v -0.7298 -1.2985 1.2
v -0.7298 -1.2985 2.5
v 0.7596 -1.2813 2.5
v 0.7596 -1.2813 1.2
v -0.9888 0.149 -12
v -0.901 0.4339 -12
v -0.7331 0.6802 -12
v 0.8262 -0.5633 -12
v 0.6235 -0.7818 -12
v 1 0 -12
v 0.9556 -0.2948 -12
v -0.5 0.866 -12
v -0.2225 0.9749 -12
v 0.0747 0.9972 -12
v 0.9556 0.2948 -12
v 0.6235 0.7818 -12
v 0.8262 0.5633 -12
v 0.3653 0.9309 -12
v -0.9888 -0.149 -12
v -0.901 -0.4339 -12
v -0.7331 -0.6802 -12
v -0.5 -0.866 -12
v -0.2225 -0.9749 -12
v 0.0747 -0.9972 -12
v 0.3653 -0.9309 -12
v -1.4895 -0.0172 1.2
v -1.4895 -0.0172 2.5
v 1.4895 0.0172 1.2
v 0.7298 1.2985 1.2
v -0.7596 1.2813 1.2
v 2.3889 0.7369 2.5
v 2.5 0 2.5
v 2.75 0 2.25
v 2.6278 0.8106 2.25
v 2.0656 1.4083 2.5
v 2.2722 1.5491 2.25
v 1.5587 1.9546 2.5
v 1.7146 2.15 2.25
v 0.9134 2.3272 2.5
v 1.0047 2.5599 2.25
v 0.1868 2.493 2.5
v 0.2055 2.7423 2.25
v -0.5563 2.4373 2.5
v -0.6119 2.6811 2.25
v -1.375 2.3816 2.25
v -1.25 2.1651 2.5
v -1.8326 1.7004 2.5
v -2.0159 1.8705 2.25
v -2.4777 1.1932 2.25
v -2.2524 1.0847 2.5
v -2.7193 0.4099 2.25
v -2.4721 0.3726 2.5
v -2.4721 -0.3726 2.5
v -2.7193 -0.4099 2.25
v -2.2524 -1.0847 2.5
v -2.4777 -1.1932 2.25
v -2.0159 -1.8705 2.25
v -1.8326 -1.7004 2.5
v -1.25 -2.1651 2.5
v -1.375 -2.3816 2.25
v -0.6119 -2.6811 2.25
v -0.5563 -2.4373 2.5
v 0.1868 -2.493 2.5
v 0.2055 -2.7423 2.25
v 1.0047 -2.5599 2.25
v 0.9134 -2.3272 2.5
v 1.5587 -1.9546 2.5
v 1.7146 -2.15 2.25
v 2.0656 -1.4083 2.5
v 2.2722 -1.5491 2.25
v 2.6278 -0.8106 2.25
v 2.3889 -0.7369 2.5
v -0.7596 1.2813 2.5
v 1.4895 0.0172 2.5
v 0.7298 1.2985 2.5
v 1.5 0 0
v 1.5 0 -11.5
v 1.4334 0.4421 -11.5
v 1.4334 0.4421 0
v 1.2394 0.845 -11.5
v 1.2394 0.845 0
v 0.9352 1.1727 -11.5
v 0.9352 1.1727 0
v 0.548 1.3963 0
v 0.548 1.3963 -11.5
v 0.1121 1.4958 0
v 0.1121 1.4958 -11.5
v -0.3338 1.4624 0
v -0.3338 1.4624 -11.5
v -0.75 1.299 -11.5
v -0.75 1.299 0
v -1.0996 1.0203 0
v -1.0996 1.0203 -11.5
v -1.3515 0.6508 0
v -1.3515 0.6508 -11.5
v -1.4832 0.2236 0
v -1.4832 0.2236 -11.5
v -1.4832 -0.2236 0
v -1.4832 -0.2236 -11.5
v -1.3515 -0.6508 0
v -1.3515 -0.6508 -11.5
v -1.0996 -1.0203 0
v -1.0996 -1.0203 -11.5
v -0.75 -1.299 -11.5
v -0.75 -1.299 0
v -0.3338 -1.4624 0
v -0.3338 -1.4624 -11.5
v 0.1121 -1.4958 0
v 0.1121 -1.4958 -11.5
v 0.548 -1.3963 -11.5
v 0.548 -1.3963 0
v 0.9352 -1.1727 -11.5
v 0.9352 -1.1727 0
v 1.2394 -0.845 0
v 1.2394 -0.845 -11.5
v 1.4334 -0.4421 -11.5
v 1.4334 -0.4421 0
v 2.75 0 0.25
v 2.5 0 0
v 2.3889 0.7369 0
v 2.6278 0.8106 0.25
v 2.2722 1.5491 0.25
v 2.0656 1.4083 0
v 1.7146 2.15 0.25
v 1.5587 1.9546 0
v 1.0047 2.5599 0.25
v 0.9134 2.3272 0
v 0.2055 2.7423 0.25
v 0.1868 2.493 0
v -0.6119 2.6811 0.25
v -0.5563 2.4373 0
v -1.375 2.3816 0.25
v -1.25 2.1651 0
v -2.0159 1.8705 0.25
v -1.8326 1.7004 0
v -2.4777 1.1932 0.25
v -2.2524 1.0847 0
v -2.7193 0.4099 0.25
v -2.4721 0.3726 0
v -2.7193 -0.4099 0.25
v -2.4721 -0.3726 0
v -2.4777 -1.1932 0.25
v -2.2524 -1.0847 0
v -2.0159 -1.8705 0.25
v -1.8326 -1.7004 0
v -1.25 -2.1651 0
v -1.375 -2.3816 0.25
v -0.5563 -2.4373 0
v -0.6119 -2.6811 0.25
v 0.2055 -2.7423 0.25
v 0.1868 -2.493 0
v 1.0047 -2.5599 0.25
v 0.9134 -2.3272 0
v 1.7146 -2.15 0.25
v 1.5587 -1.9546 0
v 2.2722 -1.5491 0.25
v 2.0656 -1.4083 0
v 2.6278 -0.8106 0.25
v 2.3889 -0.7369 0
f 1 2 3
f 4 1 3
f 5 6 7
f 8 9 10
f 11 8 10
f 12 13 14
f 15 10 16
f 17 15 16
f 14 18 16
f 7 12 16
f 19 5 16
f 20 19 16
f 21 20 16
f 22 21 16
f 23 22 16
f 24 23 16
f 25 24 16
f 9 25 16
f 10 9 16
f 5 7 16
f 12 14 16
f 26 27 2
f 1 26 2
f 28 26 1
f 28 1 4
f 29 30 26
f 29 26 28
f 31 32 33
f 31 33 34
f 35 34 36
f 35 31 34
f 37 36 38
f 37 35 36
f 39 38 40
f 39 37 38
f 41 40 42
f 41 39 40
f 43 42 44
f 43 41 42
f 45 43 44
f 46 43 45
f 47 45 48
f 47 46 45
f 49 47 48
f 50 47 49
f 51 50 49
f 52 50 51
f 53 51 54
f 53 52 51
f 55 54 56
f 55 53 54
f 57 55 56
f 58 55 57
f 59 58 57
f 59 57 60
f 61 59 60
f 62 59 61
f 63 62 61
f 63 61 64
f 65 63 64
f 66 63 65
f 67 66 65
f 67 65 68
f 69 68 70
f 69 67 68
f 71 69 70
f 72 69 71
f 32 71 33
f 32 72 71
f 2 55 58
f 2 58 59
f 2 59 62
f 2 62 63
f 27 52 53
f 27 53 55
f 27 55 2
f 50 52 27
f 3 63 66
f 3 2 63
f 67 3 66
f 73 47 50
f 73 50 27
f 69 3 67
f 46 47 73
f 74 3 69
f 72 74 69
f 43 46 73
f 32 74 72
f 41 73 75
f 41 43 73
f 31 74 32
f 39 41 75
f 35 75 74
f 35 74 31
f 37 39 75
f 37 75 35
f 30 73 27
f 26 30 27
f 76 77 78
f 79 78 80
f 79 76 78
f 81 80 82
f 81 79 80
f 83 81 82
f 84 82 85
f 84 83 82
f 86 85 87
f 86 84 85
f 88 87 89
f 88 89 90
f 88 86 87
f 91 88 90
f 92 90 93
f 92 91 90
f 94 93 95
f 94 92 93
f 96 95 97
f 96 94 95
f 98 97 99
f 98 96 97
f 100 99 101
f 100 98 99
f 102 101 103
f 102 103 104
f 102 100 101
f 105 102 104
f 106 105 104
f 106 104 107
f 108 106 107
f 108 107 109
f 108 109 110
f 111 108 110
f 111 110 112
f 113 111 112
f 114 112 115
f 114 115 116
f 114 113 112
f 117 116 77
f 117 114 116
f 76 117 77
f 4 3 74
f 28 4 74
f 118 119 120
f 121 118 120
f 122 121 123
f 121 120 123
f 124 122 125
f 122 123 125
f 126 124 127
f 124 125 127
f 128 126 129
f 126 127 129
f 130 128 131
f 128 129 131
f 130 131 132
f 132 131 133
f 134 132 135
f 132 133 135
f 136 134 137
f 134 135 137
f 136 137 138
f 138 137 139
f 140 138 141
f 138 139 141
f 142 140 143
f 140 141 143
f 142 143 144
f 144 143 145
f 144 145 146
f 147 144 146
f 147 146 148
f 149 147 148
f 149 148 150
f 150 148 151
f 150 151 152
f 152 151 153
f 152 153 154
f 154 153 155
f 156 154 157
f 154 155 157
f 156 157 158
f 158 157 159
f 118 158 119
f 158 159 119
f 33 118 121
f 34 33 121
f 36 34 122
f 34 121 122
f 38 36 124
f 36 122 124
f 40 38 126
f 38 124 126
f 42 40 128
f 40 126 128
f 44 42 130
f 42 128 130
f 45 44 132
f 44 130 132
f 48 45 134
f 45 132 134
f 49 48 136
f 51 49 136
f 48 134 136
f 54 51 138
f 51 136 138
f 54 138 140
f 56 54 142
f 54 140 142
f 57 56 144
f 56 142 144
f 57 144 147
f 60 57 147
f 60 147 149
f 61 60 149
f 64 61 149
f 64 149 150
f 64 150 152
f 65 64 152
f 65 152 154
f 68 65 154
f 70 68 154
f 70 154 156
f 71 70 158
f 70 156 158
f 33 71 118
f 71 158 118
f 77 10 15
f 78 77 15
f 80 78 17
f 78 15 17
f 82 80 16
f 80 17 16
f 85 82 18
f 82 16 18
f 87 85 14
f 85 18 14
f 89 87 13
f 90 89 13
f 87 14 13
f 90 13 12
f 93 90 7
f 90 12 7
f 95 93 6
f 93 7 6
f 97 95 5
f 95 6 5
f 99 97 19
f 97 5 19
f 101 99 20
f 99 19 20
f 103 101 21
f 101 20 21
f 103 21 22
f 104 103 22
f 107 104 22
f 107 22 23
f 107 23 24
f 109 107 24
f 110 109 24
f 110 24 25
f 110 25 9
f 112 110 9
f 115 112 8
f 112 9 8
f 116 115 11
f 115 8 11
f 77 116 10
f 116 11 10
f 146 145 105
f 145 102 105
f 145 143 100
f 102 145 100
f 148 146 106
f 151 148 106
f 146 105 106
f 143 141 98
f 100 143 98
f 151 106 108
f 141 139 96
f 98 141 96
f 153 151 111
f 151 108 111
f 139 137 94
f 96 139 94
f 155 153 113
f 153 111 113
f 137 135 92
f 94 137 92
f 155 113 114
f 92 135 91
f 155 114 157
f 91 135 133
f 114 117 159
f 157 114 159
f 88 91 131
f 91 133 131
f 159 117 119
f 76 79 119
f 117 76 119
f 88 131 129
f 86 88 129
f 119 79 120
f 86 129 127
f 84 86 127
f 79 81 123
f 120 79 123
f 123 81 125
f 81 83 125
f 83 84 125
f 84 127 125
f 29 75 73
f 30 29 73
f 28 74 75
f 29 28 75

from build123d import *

# Parameters (mm, degrees)
F0_R     = 1.5
F1_DEPTH = 12
F2_SIZE  = 0.5
F0_R_2   = 2.75
F3_DEPTH = 2.5
F4_SIZE  = 0.25
F6_DEPTH = 1.3


with BuildPart() as f1:
    # F0 (on Top) → F1 (new body)
    with BuildSketch(Plane.XY):
        Circle(F0_R)
    extrude(amount=-F1_DEPTH)

    # F2
    f2_edges = [f1.edges().sort_by_distance(p)[0] for p in [
        (-1.5, 0, -12),
    ]]
    chamfer(f2_edges, length=F2_SIZE)

    # F0 (on Top) → F3 (join)
    with BuildSketch(Plane.XY):
        Circle(F0_R_2)
        Circle(F0_R, mode=Mode.SUBTRACT)
        Circle(F0_R)
    extrude(amount=F3_DEPTH)

    # F4
    f4_edges = [f1.edges().sort_by_distance(p)[0] for p in [
        (-2.75, 0, 2.5),
        (-2.75, 0, 0),
    ]]
    chamfer(f4_edges, length=F4_SIZE)

    # F5 (on face) → F6 (cut)
    with BuildSketch(Plane.XY.offset(2.5)):
        Polygon((0.75963, -1.281313), (1.489464, 0.017202), (0.729835, 1.298515), (-0.75963, 1.281313), (-1.489464, -0.017202), (-0.729835, -1.298515), align=None)
    extrude(amount=-F6_DEPTH, mode=Mode.SUBTRACT)


solid = f1.part
